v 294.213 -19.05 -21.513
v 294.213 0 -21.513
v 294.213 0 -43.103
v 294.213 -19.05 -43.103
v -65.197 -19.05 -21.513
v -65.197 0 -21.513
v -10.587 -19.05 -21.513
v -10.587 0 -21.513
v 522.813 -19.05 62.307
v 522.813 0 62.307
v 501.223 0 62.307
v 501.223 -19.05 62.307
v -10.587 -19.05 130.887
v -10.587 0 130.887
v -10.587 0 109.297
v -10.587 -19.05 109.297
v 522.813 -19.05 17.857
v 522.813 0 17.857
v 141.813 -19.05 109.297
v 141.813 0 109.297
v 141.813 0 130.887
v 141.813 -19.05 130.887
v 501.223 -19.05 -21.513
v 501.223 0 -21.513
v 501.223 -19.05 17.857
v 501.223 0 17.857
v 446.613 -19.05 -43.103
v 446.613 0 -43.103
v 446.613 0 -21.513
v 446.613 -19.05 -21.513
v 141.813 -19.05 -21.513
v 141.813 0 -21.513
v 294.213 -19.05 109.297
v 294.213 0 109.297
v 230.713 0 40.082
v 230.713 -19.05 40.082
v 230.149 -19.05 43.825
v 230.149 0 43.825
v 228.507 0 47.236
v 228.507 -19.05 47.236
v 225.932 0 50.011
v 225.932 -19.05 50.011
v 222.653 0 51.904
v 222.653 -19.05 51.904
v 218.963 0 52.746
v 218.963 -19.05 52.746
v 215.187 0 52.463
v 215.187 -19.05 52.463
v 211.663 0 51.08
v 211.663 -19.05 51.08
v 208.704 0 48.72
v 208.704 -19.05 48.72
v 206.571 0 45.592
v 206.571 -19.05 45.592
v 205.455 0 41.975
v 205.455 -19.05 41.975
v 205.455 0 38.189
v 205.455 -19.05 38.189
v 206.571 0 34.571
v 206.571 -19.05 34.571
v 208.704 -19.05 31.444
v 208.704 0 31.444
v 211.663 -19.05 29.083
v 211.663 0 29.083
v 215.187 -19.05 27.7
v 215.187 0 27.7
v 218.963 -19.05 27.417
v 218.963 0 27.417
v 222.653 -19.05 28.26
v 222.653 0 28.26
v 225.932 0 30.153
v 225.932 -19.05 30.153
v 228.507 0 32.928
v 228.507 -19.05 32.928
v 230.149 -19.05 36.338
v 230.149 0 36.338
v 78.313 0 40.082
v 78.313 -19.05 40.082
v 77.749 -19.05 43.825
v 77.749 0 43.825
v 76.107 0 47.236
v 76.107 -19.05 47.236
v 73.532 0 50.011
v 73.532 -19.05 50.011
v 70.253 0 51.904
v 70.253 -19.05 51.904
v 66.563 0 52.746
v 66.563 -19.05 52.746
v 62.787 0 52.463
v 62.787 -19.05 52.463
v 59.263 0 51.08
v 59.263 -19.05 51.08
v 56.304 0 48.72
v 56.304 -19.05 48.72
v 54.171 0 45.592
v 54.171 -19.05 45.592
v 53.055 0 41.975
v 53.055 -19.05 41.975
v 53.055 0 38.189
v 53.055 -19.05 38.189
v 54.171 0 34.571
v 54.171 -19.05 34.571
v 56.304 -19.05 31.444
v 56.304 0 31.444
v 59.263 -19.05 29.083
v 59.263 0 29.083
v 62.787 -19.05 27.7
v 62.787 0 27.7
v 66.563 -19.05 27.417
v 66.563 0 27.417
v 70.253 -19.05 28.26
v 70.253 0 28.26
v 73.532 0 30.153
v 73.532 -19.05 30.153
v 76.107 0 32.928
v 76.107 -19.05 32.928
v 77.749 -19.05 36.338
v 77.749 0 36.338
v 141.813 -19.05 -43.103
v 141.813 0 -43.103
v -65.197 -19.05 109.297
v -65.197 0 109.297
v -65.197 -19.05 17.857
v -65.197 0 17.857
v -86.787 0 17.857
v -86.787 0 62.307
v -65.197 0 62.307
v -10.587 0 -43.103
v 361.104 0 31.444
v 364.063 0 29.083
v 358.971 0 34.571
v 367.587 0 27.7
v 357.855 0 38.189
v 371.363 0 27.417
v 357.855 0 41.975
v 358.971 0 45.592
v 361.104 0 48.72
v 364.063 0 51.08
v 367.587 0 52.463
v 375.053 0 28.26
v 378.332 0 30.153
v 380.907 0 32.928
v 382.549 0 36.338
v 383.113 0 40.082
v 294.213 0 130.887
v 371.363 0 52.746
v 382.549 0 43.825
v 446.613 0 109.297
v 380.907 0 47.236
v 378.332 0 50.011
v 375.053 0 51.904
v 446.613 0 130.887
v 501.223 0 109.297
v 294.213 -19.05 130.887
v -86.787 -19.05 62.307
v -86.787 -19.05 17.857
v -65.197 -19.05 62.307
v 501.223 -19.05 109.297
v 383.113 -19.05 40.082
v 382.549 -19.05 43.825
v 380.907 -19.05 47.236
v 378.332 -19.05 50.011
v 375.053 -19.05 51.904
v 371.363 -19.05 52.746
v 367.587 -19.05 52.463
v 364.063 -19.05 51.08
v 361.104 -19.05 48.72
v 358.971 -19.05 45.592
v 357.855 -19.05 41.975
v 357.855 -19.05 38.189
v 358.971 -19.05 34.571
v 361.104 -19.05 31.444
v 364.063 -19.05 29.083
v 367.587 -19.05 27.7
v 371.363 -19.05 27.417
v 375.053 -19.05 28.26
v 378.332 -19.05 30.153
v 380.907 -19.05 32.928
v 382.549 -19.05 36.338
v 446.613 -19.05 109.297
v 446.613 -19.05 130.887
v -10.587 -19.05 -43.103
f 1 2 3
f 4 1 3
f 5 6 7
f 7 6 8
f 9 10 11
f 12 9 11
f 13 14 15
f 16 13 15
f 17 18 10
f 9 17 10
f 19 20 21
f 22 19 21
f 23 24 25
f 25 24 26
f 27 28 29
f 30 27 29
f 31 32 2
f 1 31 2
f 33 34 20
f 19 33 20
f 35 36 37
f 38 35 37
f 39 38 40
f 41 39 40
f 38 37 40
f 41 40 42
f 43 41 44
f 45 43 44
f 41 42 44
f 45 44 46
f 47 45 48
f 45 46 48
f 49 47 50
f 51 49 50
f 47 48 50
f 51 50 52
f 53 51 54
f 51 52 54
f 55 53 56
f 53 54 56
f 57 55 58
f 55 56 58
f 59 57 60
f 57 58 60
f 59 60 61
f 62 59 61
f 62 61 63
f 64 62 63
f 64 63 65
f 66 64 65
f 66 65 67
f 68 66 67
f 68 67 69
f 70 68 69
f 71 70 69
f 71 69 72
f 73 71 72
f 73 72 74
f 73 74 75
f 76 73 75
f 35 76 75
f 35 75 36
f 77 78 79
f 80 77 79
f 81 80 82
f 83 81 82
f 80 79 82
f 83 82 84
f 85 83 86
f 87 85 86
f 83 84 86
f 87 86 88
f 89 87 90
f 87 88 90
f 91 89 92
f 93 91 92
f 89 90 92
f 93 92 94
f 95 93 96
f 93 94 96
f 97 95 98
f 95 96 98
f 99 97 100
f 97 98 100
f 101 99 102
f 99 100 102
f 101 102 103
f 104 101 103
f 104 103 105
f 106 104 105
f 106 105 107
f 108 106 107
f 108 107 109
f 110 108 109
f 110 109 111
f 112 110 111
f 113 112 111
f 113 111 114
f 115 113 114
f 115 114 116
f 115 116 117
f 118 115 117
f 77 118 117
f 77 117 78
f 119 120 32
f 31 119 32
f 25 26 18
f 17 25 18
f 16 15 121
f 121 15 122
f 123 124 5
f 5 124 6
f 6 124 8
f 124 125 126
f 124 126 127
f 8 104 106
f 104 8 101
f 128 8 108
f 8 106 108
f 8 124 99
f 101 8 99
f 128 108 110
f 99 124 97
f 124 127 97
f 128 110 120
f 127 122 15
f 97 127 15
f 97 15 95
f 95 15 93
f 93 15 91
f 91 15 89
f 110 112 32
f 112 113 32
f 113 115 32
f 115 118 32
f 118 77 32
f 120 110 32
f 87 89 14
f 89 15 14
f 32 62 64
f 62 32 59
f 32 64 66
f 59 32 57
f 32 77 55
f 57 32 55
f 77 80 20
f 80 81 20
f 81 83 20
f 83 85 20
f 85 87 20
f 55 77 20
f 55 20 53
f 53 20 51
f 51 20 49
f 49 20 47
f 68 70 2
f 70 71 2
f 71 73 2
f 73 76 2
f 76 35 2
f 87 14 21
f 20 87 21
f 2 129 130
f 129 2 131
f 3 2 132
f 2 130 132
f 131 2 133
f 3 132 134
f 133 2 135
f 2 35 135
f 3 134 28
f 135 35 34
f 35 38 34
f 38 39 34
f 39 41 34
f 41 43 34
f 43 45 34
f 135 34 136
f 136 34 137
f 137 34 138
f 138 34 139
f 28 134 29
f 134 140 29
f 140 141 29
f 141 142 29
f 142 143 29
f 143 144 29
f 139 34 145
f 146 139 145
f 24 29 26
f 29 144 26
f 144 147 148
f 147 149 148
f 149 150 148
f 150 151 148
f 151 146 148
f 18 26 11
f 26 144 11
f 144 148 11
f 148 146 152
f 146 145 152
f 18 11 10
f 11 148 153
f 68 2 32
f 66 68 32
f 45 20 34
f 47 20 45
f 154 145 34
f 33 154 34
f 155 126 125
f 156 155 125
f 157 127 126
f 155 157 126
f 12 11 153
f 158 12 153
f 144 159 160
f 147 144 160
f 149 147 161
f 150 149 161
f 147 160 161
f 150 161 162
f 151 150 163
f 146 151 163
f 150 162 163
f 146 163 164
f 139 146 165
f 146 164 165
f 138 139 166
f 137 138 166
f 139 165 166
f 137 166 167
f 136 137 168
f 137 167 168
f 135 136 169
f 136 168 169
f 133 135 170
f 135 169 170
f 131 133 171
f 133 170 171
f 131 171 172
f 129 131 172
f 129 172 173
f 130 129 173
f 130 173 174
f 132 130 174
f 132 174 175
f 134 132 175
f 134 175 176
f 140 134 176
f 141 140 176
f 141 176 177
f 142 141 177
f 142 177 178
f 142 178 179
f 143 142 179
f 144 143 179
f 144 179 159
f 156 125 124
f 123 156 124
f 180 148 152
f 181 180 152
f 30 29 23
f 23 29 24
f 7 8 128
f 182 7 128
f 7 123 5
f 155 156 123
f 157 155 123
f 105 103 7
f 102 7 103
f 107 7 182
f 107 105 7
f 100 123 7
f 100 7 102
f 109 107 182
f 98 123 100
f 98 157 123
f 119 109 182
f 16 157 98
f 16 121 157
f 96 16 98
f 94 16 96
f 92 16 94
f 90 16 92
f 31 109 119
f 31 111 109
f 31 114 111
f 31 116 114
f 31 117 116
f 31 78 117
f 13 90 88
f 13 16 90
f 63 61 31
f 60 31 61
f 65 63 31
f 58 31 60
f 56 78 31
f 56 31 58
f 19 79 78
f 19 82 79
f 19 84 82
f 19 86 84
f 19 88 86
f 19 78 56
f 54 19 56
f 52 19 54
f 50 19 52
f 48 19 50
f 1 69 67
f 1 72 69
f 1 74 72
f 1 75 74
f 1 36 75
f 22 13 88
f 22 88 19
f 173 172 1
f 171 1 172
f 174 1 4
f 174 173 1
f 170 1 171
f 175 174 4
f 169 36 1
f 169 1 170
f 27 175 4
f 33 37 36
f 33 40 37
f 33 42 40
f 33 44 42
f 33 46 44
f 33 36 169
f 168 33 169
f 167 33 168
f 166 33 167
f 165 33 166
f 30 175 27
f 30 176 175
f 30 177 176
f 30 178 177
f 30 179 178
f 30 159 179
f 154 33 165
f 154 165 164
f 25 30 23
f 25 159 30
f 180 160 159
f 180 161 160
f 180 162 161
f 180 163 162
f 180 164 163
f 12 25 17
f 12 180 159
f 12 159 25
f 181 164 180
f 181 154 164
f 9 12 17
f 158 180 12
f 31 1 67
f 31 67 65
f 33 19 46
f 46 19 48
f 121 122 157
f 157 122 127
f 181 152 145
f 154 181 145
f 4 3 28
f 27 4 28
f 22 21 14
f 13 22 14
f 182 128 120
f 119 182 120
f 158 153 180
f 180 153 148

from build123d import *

# Parameters (mm, degrees)
F1_DEPTH = 19.05
F2_R     = 12.7
F3_DEPTH = 19.051


with BuildPart() as f1:
    # F0 (on Front) → F1 (new body)
    with BuildSketch(Plane.XZ):
        Polygon((-86.786535, 62.306761), (-86.786535, 17.856761), (-65.196535, 17.856761), (-65.196535, -21.513239), (-10.586535, -21.513239), (-10.586535, -43.103239), (141.813465, -43.103239), (141.813465, -21.513239), (294.213465, -21.513239), (294.213465, -43.103239), (446.613465, -43.103239), (446.613465, -21.513239), (501.223465, -21.513239), (501.223465, 17.856761), (522.813465, 17.856761), (522.813465, 62.306761), (501.223465, 62.306761), (501.223465, 109.296761), (446.613465, 109.296761), (446.613465, 130.886761), (294.213465, 130.886761), (294.213465, 109.296761), (141.813465, 109.296761), (141.813465, 130.886761), (-10.586535, 130.886761), (-10.586535, 109.296761), (-65.196535, 109.296761), (-65.196535, 62.306761), align=None)
    extrude(amount=F1_DEPTH)

    # F2 (on face) → F3 (cut, through all)
    with BuildSketch(Plane.XZ.offset(19.05)):
        with Locations((65.613465, 40.081761)):
            Circle(F2_R)
        with Locations((218.013465, 40.081761)):
            Circle(F2_R)
        with Locations((370.413465, 40.081761)):
            Circle(F2_R)
    extrude(amount=-F3_DEPTH, mode=Mode.SUBTRACT)


solid = f1.part
